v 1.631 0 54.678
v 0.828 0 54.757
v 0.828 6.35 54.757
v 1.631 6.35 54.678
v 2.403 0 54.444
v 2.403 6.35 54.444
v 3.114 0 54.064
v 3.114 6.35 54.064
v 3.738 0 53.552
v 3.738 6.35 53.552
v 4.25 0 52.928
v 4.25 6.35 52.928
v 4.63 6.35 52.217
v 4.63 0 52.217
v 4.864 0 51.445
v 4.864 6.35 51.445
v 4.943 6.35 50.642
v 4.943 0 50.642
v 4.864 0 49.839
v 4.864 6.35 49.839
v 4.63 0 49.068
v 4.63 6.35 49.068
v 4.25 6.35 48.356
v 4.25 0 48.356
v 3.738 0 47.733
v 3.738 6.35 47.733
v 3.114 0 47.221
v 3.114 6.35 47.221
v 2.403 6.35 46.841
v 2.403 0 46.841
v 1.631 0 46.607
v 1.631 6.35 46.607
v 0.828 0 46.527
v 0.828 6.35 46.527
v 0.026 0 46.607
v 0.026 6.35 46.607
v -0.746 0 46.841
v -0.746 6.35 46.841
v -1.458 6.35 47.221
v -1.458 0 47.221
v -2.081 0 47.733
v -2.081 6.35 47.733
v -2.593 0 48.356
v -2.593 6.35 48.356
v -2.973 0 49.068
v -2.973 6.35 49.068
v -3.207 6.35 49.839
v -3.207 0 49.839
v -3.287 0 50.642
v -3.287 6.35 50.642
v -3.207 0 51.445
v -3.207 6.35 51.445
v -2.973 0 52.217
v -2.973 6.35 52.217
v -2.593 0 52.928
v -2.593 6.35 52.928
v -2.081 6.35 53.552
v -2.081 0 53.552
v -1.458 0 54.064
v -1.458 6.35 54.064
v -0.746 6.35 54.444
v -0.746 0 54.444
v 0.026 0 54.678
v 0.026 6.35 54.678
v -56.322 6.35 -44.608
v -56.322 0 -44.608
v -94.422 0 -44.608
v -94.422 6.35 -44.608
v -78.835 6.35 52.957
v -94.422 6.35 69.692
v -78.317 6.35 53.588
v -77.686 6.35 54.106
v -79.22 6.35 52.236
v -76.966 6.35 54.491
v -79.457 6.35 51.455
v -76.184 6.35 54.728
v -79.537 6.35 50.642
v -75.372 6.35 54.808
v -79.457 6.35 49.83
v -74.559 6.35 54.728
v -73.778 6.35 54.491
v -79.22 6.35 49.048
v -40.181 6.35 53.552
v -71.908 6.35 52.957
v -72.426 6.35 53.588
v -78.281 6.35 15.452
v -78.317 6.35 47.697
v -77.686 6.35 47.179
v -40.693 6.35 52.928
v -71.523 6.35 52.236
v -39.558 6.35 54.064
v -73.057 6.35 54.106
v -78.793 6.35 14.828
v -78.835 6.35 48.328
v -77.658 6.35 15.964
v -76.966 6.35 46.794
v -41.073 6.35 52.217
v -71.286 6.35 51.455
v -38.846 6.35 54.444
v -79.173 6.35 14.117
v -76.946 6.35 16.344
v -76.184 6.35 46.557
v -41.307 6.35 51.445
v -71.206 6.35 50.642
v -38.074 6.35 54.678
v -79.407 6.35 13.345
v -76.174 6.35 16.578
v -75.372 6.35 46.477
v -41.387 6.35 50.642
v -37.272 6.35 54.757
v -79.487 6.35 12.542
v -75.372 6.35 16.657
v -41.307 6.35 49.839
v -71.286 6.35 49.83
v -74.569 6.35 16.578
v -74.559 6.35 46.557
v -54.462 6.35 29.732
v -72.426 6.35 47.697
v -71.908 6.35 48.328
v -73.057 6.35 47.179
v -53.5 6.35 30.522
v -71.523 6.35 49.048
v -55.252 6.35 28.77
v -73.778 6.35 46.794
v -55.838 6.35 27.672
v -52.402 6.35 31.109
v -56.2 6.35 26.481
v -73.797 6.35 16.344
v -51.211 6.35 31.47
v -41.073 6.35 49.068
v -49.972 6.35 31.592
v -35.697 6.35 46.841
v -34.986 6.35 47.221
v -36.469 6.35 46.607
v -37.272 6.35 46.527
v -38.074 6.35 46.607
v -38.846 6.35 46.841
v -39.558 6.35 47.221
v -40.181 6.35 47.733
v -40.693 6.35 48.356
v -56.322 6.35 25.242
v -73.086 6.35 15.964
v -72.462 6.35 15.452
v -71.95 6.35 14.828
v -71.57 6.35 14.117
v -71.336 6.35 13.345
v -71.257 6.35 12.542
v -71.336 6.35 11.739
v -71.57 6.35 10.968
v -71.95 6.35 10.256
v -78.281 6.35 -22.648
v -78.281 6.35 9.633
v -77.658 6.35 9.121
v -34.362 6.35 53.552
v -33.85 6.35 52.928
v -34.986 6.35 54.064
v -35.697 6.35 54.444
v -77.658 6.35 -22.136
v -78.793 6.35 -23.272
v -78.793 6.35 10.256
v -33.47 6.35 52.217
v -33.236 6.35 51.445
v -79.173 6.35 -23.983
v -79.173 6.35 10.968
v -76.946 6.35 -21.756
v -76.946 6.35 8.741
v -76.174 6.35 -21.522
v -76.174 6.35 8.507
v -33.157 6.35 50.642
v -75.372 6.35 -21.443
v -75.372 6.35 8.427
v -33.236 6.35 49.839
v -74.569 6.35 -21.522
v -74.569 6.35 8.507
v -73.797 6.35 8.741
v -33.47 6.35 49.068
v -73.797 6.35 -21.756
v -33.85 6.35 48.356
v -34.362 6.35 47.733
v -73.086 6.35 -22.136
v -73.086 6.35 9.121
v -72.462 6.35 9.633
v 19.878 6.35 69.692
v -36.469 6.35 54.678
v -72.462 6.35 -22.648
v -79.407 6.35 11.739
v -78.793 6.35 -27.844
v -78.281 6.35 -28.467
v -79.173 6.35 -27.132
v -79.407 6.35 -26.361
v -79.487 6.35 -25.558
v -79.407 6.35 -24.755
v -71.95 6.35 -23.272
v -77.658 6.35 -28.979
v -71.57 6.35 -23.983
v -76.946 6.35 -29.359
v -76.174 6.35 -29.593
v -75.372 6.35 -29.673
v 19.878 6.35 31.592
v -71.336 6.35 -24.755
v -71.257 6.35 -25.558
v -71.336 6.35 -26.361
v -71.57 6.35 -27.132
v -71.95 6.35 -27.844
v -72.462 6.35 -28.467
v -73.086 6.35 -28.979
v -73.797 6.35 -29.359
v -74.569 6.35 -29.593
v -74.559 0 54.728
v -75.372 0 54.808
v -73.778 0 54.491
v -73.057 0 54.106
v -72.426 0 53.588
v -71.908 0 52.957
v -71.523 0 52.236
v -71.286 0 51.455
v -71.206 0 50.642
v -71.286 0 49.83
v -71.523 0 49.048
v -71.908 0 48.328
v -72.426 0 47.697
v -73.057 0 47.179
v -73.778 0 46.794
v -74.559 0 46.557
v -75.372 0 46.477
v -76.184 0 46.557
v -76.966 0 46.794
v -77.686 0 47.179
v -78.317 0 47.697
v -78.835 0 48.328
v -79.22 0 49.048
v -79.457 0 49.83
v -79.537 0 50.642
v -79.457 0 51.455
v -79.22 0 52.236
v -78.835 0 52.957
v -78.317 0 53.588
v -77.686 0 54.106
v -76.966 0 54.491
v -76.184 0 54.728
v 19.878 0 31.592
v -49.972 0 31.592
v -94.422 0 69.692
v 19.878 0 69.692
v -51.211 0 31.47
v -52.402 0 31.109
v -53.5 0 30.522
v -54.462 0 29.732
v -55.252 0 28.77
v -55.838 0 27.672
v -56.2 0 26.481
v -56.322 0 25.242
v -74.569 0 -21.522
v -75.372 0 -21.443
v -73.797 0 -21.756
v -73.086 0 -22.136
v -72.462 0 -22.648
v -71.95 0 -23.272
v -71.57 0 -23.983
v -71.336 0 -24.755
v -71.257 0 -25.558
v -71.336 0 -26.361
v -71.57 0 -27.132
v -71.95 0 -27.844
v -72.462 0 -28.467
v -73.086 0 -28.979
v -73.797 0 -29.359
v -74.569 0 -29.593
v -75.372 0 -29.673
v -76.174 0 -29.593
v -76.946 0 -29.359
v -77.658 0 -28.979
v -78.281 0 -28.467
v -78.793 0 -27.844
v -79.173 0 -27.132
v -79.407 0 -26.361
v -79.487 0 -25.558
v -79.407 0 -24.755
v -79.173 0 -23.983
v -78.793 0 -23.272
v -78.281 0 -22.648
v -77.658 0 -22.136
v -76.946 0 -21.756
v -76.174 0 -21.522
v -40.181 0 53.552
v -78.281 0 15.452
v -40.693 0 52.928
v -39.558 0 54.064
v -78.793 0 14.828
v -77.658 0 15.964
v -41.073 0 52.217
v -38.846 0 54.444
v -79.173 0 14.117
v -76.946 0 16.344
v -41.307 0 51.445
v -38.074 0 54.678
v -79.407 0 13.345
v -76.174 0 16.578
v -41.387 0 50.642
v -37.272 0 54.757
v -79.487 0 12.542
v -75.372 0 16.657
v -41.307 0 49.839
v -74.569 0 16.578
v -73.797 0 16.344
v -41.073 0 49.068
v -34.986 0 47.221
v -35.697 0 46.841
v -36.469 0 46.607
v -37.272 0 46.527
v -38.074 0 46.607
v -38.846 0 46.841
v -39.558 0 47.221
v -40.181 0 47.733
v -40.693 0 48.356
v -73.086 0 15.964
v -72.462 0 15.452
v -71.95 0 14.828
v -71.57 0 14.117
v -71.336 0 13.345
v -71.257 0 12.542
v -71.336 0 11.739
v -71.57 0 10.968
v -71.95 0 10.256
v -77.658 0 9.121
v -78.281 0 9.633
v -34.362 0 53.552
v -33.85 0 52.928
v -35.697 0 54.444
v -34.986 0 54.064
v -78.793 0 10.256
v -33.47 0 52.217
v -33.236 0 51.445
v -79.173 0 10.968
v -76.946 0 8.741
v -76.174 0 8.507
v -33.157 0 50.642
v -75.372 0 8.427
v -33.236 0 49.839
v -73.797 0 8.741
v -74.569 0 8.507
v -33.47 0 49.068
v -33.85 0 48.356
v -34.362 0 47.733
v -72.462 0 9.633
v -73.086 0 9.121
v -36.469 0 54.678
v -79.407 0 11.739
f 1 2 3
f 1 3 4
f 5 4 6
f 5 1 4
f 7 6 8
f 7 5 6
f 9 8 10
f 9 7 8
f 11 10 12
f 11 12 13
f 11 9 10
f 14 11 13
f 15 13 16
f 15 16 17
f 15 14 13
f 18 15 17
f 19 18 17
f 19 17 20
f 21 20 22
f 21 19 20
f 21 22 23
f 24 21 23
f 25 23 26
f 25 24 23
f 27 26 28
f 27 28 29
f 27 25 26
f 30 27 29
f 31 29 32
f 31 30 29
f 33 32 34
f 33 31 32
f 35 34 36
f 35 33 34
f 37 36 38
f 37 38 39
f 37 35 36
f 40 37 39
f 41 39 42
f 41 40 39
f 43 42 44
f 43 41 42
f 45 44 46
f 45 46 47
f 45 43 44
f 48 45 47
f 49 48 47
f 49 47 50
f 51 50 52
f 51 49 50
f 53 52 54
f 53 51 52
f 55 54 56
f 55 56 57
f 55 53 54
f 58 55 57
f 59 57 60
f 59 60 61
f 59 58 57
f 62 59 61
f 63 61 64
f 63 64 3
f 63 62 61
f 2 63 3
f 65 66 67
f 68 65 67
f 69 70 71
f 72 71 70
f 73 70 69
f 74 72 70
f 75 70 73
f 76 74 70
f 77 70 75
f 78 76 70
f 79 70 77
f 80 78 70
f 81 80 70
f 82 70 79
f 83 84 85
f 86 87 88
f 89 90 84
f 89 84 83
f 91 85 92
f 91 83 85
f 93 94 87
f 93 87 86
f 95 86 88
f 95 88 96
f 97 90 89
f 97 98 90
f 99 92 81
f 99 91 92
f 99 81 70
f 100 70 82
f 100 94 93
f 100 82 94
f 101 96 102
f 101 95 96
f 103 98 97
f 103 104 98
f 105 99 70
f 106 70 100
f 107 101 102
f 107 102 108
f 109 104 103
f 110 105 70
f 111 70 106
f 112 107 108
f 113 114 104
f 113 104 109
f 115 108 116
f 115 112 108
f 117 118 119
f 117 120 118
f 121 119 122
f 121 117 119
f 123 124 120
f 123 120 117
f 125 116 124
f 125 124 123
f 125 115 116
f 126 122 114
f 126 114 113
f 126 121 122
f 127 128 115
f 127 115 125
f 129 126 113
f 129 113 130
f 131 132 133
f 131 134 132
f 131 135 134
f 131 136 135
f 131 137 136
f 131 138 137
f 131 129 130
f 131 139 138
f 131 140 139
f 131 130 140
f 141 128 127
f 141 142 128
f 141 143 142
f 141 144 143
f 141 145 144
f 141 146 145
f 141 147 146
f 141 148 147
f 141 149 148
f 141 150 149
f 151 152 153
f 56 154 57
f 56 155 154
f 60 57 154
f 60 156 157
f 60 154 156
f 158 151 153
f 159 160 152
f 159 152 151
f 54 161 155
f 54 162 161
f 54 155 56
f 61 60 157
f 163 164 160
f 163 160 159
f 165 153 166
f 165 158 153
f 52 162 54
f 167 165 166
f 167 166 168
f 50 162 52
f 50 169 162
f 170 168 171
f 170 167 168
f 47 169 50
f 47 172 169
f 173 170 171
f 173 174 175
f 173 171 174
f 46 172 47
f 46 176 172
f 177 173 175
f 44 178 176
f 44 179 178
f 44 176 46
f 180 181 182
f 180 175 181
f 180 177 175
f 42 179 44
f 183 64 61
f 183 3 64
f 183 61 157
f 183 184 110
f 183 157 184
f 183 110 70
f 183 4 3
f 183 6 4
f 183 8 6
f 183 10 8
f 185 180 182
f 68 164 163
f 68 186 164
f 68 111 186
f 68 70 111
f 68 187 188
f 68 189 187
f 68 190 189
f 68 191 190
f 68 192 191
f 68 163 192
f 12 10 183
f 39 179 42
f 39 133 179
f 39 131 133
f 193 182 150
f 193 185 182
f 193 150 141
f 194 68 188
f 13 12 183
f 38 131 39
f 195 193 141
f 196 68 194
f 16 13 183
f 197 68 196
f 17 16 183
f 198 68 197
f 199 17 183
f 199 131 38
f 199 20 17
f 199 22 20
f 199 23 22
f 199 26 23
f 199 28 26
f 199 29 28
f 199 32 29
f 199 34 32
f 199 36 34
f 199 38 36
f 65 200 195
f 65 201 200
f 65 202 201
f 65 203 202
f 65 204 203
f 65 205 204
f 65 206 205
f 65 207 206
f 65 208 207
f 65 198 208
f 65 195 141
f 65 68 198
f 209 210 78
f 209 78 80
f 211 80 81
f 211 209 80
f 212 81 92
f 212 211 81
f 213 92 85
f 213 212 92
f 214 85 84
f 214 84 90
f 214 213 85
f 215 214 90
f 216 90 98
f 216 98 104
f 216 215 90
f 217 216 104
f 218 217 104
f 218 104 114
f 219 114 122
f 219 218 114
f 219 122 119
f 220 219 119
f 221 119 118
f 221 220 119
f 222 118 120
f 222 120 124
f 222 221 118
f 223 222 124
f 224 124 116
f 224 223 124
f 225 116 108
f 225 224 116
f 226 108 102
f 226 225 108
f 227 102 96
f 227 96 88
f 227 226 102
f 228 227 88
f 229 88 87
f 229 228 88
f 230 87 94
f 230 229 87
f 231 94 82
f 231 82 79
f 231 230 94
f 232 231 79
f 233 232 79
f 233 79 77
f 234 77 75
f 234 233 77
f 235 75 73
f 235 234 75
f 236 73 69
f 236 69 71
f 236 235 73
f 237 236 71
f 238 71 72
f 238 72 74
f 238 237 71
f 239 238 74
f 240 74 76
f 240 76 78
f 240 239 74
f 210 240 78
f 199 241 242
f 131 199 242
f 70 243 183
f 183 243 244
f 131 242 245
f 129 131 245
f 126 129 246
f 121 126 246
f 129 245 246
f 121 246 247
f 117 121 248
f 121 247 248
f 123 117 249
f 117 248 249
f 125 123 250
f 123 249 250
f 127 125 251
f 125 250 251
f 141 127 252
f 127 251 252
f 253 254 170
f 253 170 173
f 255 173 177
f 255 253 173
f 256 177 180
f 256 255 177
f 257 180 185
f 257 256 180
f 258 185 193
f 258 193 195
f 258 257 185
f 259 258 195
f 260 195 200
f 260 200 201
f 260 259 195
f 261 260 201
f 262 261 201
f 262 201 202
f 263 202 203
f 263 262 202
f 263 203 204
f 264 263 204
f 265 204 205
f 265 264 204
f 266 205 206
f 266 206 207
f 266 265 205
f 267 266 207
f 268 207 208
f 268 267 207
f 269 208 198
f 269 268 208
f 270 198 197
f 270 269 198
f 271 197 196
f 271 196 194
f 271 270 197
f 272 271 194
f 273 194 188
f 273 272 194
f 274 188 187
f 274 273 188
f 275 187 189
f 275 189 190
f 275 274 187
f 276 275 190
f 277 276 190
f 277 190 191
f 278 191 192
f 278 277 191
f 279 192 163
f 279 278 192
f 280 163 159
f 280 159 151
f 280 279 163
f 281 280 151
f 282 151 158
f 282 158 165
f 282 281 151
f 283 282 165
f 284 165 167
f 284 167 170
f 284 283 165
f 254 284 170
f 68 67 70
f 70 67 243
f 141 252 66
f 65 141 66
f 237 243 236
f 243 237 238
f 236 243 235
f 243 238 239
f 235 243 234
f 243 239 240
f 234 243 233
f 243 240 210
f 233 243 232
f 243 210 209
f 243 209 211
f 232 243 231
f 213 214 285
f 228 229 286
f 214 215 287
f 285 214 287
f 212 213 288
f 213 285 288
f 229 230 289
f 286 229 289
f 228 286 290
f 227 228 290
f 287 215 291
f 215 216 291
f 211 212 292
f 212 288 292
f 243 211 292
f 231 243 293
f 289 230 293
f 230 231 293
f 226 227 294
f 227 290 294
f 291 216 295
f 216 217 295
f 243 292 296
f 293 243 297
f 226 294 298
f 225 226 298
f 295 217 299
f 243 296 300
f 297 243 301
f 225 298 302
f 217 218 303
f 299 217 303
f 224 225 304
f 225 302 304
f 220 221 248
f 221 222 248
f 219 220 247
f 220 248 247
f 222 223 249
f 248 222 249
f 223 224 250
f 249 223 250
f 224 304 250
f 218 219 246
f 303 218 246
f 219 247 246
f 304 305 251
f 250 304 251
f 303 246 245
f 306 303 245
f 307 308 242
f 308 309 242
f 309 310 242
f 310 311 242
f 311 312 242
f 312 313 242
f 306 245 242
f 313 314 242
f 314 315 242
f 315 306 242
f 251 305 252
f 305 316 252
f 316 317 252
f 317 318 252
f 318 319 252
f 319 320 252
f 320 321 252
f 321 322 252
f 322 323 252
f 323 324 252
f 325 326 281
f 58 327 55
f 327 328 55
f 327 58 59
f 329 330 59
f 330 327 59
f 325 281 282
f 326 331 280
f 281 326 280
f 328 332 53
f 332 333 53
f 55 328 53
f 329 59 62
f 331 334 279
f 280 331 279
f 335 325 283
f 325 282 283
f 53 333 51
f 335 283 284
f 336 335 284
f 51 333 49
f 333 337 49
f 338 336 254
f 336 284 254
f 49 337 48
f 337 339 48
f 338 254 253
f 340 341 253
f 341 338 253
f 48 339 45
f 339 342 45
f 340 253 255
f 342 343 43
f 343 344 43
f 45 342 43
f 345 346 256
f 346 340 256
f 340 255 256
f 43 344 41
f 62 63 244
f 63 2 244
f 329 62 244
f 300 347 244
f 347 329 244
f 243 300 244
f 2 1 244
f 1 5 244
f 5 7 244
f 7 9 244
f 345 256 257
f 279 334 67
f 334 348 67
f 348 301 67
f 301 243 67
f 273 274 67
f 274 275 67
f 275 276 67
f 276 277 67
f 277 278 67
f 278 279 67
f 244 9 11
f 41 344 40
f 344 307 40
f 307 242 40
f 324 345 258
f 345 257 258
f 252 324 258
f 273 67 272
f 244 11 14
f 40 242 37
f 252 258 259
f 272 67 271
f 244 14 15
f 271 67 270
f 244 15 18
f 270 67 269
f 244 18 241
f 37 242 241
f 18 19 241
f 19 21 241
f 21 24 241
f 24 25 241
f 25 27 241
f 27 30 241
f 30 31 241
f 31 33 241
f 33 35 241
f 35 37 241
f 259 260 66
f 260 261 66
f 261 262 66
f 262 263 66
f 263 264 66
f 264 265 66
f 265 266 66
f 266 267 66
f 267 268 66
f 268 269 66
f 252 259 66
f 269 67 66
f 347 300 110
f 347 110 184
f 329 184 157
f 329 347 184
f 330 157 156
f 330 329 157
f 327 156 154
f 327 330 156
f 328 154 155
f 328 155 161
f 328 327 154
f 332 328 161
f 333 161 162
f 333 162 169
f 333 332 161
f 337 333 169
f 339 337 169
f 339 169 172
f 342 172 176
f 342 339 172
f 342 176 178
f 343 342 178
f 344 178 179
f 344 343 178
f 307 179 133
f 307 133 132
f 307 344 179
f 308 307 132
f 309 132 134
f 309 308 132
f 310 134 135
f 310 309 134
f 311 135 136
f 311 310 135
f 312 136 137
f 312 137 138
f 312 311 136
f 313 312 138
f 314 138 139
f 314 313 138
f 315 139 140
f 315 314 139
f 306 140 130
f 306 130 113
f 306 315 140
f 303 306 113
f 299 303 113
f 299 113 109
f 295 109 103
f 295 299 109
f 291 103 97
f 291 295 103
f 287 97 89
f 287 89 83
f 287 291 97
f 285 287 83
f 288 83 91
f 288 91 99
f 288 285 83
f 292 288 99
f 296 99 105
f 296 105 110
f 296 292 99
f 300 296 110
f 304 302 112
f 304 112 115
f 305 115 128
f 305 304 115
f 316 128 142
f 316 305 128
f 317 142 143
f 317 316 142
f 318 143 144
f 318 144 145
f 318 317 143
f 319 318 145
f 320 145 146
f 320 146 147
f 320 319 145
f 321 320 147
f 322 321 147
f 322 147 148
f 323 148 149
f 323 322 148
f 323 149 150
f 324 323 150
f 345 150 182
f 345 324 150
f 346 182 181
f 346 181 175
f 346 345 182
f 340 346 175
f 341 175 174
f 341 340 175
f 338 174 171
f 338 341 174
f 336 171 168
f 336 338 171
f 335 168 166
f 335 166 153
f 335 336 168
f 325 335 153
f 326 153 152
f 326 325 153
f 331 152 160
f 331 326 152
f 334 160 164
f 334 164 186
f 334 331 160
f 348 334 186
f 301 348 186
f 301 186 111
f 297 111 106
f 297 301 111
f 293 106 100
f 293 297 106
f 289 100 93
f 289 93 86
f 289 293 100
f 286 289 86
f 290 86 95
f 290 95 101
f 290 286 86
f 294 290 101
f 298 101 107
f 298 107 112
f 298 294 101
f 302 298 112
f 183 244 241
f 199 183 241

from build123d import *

# Parameters (mm, degrees)
SKETCH1_R           = 4.1656
SKETCH1_R_2         = 4.1148
BOSS_EXTRUDE1_DEPTH = 6.35


with BuildPart() as part:
    # Sketch1 → Boss-Extrude1 (new body)
    with BuildSketch(Plane(origin=(0, 0, 0), x_dir=(1, 0, 0), z_dir=(0, 1, 0))):
        with BuildLine():
            Line((-94.42173913, 44.607763975), (-94.42173913, -69.692236025))
            Line((-94.42173913, -69.692236025), (19.87826087, -69.692236025))
            Line((19.87826087, -69.692236025), (19.87826087, -31.592236025))
            Line((19.87826087, -31.592236025), (-49.97173913, -31.592236025))
            ThreePointArc((-49.97173913, -31.592236025), (-54.461867191, -29.732364085), (-56.32173913, -25.242236025))
            Line((-56.32173913, -25.242236025), (-56.32173913, 44.607763975))
            Line((-56.32173913, 44.607763975), (-94.42173913, 44.607763975))
        make_face()
        with Locations(Location((-75.37173913, -50.642236025, 0), (0, 0, 270))):
            Circle(SKETCH1_R, mode=Mode.SUBTRACT)
        with Locations(Location((0.82826087, -50.642236025, 0), (0, 0, 270))):
            Circle(SKETCH1_R_2, mode=Mode.SUBTRACT)
        with Locations(Location((-37.27173913, -50.642236025, 0), (0, 0, 270))):
            Circle(SKETCH1_R_2, mode=Mode.SUBTRACT)
        with Locations(Location((-75.37173913, 25.557763975, 0), (0, 0, 270))):
            Circle(SKETCH1_R_2, mode=Mode.SUBTRACT)
        with Locations(Location((-75.37173913, -12.542236025, 0), (0, 0, 270))):
            Circle(SKETCH1_R_2, mode=Mode.SUBTRACT)
    extrude(amount=BOSS_EXTRUDE1_DEPTH)


solid = part.part
